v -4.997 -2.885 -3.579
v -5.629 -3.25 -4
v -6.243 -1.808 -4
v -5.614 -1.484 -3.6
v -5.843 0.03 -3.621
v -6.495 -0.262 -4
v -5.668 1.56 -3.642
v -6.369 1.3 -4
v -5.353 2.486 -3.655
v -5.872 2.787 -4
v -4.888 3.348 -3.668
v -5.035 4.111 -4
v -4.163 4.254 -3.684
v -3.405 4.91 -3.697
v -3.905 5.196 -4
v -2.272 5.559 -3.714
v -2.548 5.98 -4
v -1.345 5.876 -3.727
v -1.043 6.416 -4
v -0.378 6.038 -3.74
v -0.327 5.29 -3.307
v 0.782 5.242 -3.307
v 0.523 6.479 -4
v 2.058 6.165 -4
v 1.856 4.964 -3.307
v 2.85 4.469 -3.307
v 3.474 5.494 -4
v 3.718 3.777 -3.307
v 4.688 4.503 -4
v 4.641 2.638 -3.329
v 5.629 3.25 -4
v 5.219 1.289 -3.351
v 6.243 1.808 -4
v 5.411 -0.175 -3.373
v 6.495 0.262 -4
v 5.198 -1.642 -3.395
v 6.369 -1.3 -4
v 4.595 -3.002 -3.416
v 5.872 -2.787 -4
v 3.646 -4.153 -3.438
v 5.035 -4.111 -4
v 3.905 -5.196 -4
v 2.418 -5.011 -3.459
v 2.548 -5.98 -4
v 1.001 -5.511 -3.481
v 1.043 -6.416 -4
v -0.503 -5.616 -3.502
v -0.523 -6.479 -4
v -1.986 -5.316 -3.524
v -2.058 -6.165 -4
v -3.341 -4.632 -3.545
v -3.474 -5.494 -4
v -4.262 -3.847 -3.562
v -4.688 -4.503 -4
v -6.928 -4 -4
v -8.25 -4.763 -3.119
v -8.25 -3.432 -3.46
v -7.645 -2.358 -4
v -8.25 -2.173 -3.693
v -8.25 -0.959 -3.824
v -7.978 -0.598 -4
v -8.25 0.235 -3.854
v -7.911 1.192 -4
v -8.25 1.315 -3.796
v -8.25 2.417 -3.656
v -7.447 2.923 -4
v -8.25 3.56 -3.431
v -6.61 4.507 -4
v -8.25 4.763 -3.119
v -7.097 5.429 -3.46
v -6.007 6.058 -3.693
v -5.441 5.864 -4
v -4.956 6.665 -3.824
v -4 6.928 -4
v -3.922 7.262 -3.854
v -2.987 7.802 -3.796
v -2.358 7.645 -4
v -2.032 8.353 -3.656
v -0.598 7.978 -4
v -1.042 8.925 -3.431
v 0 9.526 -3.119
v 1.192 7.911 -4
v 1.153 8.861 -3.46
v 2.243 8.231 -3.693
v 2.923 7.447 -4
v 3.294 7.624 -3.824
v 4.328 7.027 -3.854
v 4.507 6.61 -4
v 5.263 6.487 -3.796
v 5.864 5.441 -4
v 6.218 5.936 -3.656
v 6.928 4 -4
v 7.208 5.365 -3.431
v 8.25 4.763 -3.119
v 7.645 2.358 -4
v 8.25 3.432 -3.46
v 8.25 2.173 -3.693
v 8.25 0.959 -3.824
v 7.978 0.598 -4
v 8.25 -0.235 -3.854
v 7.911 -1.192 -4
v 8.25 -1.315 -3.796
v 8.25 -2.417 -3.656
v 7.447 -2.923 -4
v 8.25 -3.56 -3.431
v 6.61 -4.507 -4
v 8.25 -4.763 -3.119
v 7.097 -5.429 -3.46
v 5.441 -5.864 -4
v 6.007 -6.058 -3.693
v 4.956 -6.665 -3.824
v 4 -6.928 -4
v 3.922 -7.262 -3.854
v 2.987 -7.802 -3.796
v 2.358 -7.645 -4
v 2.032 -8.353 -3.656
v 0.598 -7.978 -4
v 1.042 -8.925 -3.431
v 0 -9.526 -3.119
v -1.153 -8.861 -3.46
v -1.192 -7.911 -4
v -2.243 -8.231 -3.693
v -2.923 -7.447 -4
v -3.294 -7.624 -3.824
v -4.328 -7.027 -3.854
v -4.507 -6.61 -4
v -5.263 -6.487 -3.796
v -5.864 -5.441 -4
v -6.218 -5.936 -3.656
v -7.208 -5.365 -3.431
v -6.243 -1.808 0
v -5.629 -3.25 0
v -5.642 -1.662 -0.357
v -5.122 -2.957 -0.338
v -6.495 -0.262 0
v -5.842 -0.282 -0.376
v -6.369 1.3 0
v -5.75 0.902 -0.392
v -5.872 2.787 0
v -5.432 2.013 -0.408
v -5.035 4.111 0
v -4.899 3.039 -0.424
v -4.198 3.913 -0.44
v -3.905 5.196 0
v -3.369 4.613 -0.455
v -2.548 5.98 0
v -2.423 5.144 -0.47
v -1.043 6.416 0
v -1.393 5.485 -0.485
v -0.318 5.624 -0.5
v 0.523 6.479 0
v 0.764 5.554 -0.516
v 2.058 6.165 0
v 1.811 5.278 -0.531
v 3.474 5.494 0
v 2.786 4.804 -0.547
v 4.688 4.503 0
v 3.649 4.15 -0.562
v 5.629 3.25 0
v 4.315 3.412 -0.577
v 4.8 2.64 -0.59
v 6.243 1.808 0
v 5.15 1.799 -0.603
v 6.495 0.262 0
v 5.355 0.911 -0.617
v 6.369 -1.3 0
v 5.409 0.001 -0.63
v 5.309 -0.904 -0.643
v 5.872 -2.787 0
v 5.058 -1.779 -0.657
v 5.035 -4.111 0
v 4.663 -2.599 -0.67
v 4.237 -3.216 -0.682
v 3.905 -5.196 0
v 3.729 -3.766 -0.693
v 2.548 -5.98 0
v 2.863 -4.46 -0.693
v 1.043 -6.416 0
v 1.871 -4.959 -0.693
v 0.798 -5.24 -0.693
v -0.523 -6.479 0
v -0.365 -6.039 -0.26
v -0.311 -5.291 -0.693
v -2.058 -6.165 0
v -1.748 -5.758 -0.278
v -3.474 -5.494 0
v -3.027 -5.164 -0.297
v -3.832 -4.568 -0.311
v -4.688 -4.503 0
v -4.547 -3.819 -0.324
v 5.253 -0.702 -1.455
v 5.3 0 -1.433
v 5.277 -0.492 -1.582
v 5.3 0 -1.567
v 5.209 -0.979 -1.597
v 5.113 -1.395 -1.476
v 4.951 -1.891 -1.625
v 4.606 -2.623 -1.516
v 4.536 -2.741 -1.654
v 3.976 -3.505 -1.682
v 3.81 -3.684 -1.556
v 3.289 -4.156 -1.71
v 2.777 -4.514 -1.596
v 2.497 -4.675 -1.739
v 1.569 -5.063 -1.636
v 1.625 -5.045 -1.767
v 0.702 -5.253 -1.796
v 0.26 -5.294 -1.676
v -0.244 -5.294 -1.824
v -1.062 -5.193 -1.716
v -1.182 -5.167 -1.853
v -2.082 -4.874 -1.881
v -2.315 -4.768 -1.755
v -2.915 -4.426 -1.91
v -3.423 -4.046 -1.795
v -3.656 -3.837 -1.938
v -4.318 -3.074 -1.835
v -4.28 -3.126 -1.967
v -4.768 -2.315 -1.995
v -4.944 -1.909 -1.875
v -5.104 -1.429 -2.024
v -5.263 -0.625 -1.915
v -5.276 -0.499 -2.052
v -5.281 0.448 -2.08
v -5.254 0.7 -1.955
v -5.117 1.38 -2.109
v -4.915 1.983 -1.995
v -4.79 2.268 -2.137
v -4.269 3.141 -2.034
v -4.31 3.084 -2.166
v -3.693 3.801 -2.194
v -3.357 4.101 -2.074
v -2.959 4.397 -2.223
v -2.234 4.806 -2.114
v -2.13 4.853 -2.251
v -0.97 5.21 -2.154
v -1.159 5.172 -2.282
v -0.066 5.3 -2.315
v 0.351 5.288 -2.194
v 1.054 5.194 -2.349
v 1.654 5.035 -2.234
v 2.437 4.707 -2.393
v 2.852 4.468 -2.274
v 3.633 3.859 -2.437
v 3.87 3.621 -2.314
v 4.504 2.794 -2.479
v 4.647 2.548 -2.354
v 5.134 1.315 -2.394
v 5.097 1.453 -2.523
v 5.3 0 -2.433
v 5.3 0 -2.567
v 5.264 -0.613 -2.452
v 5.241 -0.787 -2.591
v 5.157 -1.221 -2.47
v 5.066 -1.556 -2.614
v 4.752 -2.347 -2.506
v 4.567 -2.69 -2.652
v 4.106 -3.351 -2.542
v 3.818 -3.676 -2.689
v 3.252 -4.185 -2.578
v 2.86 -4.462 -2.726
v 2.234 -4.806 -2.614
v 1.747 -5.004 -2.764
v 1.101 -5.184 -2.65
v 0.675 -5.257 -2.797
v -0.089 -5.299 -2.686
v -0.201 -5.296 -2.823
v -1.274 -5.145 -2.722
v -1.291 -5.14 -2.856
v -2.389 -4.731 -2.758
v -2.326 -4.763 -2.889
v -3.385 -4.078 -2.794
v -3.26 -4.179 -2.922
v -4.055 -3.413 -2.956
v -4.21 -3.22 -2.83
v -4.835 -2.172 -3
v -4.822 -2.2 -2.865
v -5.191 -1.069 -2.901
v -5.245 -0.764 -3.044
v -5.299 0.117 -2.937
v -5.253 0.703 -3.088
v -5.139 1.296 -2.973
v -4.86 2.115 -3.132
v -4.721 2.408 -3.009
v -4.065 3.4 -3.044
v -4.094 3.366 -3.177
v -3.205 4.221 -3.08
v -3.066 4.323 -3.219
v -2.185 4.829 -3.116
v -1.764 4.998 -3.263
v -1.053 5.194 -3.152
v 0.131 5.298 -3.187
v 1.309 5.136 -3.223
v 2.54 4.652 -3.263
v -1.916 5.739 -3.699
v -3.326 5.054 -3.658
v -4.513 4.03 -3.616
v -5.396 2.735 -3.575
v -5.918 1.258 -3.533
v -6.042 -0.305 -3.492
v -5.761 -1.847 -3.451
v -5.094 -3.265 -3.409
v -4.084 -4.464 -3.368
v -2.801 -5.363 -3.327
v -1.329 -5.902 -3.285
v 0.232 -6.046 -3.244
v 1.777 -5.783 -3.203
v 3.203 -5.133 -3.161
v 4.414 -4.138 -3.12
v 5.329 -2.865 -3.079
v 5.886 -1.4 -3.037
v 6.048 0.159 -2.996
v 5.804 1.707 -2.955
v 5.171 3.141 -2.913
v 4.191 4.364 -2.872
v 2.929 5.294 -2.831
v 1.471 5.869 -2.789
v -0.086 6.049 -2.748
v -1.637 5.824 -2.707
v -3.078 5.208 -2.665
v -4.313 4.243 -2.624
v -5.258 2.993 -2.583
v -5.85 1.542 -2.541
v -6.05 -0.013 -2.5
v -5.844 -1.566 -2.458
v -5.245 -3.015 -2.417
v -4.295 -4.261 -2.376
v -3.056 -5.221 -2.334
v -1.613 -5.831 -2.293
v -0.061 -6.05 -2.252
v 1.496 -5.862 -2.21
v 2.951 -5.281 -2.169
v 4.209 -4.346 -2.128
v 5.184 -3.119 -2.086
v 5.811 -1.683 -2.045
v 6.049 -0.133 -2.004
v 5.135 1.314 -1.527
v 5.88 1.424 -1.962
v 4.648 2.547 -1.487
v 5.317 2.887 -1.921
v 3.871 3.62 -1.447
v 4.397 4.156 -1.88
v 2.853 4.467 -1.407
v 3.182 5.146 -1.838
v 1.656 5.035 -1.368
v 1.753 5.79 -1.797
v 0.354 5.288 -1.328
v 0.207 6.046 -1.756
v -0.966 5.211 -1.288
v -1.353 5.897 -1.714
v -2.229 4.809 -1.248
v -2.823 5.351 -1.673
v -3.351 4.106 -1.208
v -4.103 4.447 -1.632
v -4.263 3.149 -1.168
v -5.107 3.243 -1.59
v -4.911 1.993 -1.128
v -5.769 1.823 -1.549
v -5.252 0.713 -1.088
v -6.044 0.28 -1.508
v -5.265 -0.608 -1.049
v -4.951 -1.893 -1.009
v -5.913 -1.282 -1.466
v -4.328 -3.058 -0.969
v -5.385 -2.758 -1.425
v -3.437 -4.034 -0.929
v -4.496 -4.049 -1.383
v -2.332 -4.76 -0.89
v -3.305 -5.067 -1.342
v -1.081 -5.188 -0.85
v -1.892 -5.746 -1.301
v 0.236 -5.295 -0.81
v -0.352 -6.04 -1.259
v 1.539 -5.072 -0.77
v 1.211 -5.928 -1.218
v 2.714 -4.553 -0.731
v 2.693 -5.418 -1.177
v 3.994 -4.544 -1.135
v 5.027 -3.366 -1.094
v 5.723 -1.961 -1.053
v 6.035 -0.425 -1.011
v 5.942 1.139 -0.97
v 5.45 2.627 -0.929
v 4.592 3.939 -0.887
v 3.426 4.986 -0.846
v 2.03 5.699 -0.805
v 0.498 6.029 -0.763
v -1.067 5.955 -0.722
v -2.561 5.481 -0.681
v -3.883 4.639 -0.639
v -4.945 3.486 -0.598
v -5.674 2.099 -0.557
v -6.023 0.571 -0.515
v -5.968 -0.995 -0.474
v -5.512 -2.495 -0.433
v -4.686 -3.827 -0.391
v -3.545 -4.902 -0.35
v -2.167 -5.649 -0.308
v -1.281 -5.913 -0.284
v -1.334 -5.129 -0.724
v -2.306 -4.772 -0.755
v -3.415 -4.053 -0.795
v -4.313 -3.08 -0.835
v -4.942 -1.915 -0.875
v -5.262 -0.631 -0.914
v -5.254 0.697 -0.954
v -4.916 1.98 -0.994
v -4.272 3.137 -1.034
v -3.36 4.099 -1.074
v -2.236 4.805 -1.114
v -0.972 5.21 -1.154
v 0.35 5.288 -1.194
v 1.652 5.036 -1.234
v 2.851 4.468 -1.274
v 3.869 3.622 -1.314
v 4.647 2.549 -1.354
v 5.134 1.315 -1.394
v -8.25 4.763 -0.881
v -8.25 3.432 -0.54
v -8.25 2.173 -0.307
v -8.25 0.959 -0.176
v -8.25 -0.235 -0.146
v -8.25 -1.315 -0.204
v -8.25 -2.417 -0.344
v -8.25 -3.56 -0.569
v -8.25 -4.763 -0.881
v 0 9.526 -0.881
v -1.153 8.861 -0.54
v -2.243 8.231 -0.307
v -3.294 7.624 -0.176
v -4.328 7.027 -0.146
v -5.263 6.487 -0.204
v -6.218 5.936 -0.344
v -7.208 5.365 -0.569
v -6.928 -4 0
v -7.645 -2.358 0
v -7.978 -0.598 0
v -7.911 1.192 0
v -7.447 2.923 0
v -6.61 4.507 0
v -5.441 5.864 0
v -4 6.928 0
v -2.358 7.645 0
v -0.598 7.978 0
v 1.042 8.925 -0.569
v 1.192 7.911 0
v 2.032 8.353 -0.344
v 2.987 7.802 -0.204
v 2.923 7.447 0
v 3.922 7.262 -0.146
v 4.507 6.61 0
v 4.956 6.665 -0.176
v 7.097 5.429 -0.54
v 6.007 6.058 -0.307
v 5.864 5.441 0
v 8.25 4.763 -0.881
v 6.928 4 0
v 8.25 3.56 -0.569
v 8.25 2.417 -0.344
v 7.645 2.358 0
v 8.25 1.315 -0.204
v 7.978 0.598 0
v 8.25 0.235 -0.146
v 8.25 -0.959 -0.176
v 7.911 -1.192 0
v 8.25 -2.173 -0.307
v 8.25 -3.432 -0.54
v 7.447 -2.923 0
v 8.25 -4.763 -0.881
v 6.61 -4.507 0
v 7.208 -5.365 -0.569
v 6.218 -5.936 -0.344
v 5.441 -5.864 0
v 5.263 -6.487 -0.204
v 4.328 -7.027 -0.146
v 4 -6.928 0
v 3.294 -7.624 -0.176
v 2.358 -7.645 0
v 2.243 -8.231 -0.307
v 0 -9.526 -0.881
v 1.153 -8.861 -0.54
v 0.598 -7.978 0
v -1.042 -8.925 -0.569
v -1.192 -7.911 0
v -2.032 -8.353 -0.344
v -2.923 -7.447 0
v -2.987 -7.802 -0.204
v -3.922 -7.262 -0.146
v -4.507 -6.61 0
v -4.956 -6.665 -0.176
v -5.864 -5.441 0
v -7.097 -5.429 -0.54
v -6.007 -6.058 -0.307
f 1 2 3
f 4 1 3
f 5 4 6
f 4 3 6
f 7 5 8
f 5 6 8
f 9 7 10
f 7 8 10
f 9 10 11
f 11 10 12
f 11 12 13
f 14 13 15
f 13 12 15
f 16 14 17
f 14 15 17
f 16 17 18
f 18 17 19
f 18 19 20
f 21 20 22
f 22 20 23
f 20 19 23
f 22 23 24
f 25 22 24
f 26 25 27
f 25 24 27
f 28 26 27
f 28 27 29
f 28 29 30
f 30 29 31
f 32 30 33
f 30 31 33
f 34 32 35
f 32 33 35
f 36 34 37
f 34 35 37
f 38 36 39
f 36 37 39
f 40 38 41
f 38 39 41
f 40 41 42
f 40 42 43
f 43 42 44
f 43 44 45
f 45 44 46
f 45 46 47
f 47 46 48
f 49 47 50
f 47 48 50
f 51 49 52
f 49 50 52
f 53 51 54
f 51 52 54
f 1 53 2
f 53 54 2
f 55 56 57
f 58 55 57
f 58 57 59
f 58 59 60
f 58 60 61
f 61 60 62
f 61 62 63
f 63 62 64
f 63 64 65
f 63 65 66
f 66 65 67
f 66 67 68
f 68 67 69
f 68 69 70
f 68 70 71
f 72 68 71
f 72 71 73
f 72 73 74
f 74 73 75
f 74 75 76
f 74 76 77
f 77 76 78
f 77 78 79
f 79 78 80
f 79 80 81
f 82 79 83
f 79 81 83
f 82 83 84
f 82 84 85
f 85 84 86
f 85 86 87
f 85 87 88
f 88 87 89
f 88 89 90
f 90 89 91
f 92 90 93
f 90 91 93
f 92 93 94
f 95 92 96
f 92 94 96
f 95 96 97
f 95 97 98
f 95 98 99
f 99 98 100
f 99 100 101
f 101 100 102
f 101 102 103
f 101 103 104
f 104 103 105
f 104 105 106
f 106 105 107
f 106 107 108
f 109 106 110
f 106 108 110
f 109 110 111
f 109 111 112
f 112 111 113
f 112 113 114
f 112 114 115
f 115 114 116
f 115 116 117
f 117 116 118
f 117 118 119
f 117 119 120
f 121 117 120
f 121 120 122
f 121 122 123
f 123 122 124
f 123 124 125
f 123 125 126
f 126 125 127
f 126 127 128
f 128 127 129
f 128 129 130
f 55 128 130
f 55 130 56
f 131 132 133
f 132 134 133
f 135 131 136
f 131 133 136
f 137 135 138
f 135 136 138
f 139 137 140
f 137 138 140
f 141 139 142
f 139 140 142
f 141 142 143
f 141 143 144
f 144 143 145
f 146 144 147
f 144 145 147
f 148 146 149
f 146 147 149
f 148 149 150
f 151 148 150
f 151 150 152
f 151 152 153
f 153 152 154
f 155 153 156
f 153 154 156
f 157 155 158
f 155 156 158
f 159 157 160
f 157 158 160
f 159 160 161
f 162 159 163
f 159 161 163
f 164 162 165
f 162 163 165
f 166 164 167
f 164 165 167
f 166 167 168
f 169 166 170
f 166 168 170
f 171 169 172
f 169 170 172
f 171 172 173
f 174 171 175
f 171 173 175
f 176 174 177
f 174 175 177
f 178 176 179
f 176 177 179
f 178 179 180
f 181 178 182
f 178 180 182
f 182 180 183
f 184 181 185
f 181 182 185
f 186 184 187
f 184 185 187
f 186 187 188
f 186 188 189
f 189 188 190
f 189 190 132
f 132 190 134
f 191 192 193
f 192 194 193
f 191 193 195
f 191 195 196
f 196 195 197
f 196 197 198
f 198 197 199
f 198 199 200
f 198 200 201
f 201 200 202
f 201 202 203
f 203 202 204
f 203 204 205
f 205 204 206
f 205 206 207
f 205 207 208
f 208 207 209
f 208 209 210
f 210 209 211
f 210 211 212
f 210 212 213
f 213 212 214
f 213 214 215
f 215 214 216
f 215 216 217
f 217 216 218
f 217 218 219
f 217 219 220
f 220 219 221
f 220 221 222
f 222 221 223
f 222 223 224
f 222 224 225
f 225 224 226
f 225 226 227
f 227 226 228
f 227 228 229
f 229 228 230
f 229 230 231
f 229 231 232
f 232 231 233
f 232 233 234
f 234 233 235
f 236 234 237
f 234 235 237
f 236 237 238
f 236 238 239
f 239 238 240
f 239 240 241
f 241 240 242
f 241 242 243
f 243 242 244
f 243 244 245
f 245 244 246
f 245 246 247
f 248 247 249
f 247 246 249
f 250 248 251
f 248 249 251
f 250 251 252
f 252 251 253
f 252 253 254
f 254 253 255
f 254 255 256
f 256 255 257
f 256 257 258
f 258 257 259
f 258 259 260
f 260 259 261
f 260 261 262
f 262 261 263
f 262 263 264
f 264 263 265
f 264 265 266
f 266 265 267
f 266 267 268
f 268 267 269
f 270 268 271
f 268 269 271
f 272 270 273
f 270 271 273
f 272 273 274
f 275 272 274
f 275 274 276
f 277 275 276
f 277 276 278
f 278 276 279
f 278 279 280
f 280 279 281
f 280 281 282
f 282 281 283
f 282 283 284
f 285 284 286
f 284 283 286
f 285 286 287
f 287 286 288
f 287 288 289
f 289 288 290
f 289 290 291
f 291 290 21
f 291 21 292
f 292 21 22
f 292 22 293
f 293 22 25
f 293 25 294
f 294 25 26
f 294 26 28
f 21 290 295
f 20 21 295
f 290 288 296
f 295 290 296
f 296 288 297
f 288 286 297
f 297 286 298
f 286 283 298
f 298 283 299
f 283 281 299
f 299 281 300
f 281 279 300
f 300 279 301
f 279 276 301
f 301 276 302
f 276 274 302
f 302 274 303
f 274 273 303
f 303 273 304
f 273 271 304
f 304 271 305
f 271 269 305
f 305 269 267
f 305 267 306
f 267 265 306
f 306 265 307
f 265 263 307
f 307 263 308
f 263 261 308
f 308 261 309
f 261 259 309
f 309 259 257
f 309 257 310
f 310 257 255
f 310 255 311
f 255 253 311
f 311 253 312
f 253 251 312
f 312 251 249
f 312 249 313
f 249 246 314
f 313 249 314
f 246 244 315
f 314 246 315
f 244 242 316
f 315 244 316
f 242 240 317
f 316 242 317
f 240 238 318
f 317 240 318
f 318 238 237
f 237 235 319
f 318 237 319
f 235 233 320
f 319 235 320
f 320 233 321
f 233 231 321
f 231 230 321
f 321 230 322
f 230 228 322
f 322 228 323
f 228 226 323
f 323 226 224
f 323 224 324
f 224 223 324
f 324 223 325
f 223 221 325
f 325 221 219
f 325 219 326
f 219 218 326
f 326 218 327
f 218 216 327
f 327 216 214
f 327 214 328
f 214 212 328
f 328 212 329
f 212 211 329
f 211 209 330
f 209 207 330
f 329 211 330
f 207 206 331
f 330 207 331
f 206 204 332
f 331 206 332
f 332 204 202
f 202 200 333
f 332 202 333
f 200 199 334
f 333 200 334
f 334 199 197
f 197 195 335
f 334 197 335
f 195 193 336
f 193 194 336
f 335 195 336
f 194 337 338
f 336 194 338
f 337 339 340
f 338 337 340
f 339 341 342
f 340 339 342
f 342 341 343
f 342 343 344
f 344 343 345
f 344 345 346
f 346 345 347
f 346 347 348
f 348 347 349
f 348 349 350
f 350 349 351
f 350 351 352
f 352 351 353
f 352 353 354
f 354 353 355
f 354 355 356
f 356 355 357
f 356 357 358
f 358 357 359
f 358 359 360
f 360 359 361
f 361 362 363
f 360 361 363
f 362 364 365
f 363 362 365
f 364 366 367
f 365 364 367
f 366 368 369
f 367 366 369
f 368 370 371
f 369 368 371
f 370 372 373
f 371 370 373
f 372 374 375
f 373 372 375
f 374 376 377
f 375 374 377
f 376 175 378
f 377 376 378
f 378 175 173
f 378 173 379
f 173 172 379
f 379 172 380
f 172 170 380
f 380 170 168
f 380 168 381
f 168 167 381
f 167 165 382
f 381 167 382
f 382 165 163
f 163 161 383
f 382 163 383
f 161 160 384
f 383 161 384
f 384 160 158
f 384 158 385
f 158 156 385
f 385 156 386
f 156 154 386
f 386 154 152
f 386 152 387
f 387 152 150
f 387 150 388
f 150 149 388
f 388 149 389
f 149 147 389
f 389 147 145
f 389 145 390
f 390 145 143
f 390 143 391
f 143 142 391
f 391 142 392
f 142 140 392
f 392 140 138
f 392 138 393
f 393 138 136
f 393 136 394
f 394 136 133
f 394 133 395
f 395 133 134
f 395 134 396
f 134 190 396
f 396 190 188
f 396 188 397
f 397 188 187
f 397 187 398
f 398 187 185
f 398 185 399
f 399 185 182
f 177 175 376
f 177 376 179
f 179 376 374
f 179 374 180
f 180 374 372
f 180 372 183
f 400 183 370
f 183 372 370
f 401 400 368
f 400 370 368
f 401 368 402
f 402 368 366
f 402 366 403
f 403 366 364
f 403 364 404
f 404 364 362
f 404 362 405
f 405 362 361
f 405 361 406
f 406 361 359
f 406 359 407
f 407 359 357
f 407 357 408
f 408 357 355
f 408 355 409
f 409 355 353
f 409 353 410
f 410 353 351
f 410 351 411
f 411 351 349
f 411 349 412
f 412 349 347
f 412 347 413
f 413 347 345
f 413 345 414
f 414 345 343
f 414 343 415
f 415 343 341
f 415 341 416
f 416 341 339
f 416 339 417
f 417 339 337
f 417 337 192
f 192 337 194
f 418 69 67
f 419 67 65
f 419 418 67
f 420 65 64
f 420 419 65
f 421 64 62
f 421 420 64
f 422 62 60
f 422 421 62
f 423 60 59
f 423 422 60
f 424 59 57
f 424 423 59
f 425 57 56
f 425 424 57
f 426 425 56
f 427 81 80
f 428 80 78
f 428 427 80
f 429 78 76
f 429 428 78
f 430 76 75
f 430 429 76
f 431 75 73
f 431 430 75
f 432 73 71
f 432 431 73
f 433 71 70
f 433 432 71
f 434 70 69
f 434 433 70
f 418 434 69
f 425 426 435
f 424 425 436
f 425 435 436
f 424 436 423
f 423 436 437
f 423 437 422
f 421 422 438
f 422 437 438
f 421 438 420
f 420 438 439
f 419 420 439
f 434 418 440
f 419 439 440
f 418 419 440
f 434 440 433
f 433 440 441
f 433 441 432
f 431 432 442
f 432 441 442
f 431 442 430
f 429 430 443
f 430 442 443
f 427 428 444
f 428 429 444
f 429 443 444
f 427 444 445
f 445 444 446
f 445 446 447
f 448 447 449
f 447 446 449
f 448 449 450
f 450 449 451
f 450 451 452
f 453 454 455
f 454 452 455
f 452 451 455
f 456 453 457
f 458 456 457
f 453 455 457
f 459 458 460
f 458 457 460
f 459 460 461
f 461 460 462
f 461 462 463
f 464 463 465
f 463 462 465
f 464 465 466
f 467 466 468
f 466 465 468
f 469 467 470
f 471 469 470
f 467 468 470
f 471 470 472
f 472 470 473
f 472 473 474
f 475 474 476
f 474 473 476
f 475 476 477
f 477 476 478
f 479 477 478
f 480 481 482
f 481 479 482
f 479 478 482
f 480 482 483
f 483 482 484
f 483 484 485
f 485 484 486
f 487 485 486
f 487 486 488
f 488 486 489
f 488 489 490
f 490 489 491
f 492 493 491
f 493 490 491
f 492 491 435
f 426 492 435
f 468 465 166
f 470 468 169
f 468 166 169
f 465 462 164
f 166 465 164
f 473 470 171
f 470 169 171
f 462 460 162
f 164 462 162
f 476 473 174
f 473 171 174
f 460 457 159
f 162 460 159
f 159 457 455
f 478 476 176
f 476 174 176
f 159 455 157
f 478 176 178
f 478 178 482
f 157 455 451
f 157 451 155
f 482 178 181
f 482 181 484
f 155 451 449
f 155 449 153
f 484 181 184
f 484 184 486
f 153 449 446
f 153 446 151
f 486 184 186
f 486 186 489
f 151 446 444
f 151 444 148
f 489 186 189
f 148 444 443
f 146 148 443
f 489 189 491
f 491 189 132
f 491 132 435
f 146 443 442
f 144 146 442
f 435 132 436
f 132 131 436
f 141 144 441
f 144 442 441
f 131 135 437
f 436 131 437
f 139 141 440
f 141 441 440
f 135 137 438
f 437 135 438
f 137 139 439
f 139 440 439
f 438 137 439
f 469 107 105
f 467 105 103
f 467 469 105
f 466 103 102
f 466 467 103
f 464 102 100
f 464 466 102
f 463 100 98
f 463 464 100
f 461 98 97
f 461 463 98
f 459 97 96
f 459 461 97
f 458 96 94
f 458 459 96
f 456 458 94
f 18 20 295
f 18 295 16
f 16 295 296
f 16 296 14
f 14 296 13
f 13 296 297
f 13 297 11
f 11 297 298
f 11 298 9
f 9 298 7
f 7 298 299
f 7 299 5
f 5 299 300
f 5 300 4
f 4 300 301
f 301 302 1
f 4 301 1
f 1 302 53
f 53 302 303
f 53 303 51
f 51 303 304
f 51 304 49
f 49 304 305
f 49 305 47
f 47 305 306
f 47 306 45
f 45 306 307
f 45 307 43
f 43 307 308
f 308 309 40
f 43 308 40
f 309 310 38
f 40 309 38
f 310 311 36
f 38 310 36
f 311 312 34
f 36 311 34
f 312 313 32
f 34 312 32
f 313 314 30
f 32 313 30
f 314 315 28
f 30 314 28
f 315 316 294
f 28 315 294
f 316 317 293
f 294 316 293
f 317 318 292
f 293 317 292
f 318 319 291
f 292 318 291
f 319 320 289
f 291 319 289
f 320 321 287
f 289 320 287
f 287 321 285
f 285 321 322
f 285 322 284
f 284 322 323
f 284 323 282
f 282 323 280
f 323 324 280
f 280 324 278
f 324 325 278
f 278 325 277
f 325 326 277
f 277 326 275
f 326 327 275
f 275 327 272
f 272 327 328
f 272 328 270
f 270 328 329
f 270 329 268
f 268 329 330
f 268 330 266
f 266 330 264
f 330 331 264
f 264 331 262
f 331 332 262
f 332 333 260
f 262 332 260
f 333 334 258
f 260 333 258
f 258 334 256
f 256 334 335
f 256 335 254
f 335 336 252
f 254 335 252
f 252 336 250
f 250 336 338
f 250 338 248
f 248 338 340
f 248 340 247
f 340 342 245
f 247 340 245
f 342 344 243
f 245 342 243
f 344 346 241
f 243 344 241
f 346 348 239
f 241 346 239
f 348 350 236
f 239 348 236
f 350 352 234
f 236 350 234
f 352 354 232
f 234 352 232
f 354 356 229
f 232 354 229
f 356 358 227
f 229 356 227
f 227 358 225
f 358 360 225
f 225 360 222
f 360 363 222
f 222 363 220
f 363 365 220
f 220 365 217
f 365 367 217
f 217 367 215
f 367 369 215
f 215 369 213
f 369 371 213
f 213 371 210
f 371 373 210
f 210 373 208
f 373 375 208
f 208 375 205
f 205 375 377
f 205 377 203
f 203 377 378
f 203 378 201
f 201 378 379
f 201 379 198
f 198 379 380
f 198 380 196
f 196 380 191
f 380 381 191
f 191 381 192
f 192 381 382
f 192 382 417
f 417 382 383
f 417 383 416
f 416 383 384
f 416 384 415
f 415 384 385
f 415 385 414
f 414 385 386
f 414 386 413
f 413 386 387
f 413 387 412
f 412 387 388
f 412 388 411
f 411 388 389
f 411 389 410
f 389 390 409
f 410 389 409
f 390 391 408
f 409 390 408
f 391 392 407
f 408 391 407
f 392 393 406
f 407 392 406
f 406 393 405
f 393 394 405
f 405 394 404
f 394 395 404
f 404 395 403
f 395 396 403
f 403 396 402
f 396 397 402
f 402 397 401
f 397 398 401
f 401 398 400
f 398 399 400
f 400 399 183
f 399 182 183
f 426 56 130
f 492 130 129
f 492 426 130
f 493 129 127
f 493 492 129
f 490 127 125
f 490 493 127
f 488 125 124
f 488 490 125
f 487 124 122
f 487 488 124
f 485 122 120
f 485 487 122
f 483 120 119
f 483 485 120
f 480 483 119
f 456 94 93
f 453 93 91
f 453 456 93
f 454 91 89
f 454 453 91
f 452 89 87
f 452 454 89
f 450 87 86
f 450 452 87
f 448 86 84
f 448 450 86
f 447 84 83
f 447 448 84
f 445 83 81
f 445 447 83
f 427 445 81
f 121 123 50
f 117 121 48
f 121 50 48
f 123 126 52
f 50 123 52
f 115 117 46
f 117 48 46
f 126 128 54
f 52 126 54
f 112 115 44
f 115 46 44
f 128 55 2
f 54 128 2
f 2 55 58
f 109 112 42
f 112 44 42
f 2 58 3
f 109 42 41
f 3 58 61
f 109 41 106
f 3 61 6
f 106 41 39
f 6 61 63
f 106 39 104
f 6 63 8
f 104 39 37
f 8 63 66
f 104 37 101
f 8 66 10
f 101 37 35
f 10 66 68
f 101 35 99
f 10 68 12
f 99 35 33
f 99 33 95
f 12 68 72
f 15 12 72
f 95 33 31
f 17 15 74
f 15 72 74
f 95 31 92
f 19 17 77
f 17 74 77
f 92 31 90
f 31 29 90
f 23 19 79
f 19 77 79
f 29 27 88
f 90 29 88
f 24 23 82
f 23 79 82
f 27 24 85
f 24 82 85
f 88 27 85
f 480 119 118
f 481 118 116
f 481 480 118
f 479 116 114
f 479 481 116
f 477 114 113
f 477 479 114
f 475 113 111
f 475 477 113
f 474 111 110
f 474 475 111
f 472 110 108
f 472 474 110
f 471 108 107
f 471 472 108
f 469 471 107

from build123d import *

# Parameters (mm, degrees)
SKETCH_1_W          = 4
SKETCH_1_H          = 5.45
SKETCH_2_R          = 11
CUT_EXTRUDE_1_DEPTH = 16.72021
SKETCH_3_W          = 6
SKETCH_3_H          = 8.964102
SWEEP_1_PITCH       = 1
SWEEP_1_HEIGHT      = 10
SWEEP_1_RADIUS      = 6.05
SWEEP_1_START_ANGLE = 180


with BuildPart() as part:
    # Эскиз1 → Повернуть1 (revolve)
    with BuildSketch(Plane(origin=(0, 0, 0), x_dir=(0, 0, -1), z_dir=(1, 0, 0)), mode=Mode.PRIVATE) as revolve_1_sk:
        with Locations((2, 8.025)):
            Rectangle(SKETCH_1_W, SKETCH_1_H)
    revolve(revolve_1_sk.sketch.rotate(Axis((0, 0, 0), (0, 0, -1)), 90), axis=Axis((0, 0, 0), (0, 0, -1)))

    # Эскиз2 → Вырез-Вытянуть1 (cut, through all)
    with BuildSketch(Plane.XY):
        Circle(SKETCH_2_R)
        Polygon((8.25, -4.76314), (8.25, 4.76314), (0, 9.526279), (-8.25, 4.76314), (-8.25, -4.76314), (0, -9.526279), align=None, mode=Mode.SUBTRACT)
    extrude(amount=-CUT_EXTRUDE_1_DEPTH, mode=Mode.SUBTRACT)

    # Эскиз3 → Вырез-Повернуть1 (revolve, cut)
    with BuildSketch(Plane(origin=(0, 0, 0), x_dir=(0, 0, -1), z_dir=(1, 0, 0)), mode=Mode.PRIVATE) as cut_revolve_1_sk:
        with Locations((2, 6.517949)):
            Rectangle(SKETCH_3_W, SKETCH_3_H)
        Polygon((2, 3.035898), (4, 6.5), (4, 8), (2.845299, 10), (1.154701, 10), (0, 8), (0, 6.5), align=None, mode=Mode.SUBTRACT)
    revolve(cut_revolve_1_sk.sketch.rotate(Axis((0, 0, 0), (0, 0, -1)), 240), axis=Axis((0, 0, 0), (0, 0, -1)), mode=Mode.SUBTRACT)

    # Вырез-По траектории1: sweep along a helix
    with BuildLine() as sweep_1_path:
        add(Helix(SWEEP_1_PITCH, SWEEP_1_HEIGHT, SWEEP_1_RADIUS, center=(0, 0, -4), direction=(0, 0, 1), mode=Mode.PRIVATE).rotate(Axis((0, 0, -4), (0, 0, 1)), SWEEP_1_START_ANGLE))
    with BuildLine() as sweep_1_axis:
        Line((0, 0, -4), (0, 0, 6))
    # Эскиз5 → Вырез-По траектории1 (sweep, cut)
    with BuildSketch(Plane(origin=(-6.05, 0, -4), x_dir=(-1, 0, 0), z_dir=(0, -0.9996541608311538, 0.026297504310521795))):
        Polygon((-0.861695, 0.9975), (0, 0.5), (-0.861695, 0.0025), align=None)
    sweep(path=sweep_1_path.line, binormal=sweep_1_axis.edges()[0], mode=Mode.SUBTRACT)


solid = part.part
